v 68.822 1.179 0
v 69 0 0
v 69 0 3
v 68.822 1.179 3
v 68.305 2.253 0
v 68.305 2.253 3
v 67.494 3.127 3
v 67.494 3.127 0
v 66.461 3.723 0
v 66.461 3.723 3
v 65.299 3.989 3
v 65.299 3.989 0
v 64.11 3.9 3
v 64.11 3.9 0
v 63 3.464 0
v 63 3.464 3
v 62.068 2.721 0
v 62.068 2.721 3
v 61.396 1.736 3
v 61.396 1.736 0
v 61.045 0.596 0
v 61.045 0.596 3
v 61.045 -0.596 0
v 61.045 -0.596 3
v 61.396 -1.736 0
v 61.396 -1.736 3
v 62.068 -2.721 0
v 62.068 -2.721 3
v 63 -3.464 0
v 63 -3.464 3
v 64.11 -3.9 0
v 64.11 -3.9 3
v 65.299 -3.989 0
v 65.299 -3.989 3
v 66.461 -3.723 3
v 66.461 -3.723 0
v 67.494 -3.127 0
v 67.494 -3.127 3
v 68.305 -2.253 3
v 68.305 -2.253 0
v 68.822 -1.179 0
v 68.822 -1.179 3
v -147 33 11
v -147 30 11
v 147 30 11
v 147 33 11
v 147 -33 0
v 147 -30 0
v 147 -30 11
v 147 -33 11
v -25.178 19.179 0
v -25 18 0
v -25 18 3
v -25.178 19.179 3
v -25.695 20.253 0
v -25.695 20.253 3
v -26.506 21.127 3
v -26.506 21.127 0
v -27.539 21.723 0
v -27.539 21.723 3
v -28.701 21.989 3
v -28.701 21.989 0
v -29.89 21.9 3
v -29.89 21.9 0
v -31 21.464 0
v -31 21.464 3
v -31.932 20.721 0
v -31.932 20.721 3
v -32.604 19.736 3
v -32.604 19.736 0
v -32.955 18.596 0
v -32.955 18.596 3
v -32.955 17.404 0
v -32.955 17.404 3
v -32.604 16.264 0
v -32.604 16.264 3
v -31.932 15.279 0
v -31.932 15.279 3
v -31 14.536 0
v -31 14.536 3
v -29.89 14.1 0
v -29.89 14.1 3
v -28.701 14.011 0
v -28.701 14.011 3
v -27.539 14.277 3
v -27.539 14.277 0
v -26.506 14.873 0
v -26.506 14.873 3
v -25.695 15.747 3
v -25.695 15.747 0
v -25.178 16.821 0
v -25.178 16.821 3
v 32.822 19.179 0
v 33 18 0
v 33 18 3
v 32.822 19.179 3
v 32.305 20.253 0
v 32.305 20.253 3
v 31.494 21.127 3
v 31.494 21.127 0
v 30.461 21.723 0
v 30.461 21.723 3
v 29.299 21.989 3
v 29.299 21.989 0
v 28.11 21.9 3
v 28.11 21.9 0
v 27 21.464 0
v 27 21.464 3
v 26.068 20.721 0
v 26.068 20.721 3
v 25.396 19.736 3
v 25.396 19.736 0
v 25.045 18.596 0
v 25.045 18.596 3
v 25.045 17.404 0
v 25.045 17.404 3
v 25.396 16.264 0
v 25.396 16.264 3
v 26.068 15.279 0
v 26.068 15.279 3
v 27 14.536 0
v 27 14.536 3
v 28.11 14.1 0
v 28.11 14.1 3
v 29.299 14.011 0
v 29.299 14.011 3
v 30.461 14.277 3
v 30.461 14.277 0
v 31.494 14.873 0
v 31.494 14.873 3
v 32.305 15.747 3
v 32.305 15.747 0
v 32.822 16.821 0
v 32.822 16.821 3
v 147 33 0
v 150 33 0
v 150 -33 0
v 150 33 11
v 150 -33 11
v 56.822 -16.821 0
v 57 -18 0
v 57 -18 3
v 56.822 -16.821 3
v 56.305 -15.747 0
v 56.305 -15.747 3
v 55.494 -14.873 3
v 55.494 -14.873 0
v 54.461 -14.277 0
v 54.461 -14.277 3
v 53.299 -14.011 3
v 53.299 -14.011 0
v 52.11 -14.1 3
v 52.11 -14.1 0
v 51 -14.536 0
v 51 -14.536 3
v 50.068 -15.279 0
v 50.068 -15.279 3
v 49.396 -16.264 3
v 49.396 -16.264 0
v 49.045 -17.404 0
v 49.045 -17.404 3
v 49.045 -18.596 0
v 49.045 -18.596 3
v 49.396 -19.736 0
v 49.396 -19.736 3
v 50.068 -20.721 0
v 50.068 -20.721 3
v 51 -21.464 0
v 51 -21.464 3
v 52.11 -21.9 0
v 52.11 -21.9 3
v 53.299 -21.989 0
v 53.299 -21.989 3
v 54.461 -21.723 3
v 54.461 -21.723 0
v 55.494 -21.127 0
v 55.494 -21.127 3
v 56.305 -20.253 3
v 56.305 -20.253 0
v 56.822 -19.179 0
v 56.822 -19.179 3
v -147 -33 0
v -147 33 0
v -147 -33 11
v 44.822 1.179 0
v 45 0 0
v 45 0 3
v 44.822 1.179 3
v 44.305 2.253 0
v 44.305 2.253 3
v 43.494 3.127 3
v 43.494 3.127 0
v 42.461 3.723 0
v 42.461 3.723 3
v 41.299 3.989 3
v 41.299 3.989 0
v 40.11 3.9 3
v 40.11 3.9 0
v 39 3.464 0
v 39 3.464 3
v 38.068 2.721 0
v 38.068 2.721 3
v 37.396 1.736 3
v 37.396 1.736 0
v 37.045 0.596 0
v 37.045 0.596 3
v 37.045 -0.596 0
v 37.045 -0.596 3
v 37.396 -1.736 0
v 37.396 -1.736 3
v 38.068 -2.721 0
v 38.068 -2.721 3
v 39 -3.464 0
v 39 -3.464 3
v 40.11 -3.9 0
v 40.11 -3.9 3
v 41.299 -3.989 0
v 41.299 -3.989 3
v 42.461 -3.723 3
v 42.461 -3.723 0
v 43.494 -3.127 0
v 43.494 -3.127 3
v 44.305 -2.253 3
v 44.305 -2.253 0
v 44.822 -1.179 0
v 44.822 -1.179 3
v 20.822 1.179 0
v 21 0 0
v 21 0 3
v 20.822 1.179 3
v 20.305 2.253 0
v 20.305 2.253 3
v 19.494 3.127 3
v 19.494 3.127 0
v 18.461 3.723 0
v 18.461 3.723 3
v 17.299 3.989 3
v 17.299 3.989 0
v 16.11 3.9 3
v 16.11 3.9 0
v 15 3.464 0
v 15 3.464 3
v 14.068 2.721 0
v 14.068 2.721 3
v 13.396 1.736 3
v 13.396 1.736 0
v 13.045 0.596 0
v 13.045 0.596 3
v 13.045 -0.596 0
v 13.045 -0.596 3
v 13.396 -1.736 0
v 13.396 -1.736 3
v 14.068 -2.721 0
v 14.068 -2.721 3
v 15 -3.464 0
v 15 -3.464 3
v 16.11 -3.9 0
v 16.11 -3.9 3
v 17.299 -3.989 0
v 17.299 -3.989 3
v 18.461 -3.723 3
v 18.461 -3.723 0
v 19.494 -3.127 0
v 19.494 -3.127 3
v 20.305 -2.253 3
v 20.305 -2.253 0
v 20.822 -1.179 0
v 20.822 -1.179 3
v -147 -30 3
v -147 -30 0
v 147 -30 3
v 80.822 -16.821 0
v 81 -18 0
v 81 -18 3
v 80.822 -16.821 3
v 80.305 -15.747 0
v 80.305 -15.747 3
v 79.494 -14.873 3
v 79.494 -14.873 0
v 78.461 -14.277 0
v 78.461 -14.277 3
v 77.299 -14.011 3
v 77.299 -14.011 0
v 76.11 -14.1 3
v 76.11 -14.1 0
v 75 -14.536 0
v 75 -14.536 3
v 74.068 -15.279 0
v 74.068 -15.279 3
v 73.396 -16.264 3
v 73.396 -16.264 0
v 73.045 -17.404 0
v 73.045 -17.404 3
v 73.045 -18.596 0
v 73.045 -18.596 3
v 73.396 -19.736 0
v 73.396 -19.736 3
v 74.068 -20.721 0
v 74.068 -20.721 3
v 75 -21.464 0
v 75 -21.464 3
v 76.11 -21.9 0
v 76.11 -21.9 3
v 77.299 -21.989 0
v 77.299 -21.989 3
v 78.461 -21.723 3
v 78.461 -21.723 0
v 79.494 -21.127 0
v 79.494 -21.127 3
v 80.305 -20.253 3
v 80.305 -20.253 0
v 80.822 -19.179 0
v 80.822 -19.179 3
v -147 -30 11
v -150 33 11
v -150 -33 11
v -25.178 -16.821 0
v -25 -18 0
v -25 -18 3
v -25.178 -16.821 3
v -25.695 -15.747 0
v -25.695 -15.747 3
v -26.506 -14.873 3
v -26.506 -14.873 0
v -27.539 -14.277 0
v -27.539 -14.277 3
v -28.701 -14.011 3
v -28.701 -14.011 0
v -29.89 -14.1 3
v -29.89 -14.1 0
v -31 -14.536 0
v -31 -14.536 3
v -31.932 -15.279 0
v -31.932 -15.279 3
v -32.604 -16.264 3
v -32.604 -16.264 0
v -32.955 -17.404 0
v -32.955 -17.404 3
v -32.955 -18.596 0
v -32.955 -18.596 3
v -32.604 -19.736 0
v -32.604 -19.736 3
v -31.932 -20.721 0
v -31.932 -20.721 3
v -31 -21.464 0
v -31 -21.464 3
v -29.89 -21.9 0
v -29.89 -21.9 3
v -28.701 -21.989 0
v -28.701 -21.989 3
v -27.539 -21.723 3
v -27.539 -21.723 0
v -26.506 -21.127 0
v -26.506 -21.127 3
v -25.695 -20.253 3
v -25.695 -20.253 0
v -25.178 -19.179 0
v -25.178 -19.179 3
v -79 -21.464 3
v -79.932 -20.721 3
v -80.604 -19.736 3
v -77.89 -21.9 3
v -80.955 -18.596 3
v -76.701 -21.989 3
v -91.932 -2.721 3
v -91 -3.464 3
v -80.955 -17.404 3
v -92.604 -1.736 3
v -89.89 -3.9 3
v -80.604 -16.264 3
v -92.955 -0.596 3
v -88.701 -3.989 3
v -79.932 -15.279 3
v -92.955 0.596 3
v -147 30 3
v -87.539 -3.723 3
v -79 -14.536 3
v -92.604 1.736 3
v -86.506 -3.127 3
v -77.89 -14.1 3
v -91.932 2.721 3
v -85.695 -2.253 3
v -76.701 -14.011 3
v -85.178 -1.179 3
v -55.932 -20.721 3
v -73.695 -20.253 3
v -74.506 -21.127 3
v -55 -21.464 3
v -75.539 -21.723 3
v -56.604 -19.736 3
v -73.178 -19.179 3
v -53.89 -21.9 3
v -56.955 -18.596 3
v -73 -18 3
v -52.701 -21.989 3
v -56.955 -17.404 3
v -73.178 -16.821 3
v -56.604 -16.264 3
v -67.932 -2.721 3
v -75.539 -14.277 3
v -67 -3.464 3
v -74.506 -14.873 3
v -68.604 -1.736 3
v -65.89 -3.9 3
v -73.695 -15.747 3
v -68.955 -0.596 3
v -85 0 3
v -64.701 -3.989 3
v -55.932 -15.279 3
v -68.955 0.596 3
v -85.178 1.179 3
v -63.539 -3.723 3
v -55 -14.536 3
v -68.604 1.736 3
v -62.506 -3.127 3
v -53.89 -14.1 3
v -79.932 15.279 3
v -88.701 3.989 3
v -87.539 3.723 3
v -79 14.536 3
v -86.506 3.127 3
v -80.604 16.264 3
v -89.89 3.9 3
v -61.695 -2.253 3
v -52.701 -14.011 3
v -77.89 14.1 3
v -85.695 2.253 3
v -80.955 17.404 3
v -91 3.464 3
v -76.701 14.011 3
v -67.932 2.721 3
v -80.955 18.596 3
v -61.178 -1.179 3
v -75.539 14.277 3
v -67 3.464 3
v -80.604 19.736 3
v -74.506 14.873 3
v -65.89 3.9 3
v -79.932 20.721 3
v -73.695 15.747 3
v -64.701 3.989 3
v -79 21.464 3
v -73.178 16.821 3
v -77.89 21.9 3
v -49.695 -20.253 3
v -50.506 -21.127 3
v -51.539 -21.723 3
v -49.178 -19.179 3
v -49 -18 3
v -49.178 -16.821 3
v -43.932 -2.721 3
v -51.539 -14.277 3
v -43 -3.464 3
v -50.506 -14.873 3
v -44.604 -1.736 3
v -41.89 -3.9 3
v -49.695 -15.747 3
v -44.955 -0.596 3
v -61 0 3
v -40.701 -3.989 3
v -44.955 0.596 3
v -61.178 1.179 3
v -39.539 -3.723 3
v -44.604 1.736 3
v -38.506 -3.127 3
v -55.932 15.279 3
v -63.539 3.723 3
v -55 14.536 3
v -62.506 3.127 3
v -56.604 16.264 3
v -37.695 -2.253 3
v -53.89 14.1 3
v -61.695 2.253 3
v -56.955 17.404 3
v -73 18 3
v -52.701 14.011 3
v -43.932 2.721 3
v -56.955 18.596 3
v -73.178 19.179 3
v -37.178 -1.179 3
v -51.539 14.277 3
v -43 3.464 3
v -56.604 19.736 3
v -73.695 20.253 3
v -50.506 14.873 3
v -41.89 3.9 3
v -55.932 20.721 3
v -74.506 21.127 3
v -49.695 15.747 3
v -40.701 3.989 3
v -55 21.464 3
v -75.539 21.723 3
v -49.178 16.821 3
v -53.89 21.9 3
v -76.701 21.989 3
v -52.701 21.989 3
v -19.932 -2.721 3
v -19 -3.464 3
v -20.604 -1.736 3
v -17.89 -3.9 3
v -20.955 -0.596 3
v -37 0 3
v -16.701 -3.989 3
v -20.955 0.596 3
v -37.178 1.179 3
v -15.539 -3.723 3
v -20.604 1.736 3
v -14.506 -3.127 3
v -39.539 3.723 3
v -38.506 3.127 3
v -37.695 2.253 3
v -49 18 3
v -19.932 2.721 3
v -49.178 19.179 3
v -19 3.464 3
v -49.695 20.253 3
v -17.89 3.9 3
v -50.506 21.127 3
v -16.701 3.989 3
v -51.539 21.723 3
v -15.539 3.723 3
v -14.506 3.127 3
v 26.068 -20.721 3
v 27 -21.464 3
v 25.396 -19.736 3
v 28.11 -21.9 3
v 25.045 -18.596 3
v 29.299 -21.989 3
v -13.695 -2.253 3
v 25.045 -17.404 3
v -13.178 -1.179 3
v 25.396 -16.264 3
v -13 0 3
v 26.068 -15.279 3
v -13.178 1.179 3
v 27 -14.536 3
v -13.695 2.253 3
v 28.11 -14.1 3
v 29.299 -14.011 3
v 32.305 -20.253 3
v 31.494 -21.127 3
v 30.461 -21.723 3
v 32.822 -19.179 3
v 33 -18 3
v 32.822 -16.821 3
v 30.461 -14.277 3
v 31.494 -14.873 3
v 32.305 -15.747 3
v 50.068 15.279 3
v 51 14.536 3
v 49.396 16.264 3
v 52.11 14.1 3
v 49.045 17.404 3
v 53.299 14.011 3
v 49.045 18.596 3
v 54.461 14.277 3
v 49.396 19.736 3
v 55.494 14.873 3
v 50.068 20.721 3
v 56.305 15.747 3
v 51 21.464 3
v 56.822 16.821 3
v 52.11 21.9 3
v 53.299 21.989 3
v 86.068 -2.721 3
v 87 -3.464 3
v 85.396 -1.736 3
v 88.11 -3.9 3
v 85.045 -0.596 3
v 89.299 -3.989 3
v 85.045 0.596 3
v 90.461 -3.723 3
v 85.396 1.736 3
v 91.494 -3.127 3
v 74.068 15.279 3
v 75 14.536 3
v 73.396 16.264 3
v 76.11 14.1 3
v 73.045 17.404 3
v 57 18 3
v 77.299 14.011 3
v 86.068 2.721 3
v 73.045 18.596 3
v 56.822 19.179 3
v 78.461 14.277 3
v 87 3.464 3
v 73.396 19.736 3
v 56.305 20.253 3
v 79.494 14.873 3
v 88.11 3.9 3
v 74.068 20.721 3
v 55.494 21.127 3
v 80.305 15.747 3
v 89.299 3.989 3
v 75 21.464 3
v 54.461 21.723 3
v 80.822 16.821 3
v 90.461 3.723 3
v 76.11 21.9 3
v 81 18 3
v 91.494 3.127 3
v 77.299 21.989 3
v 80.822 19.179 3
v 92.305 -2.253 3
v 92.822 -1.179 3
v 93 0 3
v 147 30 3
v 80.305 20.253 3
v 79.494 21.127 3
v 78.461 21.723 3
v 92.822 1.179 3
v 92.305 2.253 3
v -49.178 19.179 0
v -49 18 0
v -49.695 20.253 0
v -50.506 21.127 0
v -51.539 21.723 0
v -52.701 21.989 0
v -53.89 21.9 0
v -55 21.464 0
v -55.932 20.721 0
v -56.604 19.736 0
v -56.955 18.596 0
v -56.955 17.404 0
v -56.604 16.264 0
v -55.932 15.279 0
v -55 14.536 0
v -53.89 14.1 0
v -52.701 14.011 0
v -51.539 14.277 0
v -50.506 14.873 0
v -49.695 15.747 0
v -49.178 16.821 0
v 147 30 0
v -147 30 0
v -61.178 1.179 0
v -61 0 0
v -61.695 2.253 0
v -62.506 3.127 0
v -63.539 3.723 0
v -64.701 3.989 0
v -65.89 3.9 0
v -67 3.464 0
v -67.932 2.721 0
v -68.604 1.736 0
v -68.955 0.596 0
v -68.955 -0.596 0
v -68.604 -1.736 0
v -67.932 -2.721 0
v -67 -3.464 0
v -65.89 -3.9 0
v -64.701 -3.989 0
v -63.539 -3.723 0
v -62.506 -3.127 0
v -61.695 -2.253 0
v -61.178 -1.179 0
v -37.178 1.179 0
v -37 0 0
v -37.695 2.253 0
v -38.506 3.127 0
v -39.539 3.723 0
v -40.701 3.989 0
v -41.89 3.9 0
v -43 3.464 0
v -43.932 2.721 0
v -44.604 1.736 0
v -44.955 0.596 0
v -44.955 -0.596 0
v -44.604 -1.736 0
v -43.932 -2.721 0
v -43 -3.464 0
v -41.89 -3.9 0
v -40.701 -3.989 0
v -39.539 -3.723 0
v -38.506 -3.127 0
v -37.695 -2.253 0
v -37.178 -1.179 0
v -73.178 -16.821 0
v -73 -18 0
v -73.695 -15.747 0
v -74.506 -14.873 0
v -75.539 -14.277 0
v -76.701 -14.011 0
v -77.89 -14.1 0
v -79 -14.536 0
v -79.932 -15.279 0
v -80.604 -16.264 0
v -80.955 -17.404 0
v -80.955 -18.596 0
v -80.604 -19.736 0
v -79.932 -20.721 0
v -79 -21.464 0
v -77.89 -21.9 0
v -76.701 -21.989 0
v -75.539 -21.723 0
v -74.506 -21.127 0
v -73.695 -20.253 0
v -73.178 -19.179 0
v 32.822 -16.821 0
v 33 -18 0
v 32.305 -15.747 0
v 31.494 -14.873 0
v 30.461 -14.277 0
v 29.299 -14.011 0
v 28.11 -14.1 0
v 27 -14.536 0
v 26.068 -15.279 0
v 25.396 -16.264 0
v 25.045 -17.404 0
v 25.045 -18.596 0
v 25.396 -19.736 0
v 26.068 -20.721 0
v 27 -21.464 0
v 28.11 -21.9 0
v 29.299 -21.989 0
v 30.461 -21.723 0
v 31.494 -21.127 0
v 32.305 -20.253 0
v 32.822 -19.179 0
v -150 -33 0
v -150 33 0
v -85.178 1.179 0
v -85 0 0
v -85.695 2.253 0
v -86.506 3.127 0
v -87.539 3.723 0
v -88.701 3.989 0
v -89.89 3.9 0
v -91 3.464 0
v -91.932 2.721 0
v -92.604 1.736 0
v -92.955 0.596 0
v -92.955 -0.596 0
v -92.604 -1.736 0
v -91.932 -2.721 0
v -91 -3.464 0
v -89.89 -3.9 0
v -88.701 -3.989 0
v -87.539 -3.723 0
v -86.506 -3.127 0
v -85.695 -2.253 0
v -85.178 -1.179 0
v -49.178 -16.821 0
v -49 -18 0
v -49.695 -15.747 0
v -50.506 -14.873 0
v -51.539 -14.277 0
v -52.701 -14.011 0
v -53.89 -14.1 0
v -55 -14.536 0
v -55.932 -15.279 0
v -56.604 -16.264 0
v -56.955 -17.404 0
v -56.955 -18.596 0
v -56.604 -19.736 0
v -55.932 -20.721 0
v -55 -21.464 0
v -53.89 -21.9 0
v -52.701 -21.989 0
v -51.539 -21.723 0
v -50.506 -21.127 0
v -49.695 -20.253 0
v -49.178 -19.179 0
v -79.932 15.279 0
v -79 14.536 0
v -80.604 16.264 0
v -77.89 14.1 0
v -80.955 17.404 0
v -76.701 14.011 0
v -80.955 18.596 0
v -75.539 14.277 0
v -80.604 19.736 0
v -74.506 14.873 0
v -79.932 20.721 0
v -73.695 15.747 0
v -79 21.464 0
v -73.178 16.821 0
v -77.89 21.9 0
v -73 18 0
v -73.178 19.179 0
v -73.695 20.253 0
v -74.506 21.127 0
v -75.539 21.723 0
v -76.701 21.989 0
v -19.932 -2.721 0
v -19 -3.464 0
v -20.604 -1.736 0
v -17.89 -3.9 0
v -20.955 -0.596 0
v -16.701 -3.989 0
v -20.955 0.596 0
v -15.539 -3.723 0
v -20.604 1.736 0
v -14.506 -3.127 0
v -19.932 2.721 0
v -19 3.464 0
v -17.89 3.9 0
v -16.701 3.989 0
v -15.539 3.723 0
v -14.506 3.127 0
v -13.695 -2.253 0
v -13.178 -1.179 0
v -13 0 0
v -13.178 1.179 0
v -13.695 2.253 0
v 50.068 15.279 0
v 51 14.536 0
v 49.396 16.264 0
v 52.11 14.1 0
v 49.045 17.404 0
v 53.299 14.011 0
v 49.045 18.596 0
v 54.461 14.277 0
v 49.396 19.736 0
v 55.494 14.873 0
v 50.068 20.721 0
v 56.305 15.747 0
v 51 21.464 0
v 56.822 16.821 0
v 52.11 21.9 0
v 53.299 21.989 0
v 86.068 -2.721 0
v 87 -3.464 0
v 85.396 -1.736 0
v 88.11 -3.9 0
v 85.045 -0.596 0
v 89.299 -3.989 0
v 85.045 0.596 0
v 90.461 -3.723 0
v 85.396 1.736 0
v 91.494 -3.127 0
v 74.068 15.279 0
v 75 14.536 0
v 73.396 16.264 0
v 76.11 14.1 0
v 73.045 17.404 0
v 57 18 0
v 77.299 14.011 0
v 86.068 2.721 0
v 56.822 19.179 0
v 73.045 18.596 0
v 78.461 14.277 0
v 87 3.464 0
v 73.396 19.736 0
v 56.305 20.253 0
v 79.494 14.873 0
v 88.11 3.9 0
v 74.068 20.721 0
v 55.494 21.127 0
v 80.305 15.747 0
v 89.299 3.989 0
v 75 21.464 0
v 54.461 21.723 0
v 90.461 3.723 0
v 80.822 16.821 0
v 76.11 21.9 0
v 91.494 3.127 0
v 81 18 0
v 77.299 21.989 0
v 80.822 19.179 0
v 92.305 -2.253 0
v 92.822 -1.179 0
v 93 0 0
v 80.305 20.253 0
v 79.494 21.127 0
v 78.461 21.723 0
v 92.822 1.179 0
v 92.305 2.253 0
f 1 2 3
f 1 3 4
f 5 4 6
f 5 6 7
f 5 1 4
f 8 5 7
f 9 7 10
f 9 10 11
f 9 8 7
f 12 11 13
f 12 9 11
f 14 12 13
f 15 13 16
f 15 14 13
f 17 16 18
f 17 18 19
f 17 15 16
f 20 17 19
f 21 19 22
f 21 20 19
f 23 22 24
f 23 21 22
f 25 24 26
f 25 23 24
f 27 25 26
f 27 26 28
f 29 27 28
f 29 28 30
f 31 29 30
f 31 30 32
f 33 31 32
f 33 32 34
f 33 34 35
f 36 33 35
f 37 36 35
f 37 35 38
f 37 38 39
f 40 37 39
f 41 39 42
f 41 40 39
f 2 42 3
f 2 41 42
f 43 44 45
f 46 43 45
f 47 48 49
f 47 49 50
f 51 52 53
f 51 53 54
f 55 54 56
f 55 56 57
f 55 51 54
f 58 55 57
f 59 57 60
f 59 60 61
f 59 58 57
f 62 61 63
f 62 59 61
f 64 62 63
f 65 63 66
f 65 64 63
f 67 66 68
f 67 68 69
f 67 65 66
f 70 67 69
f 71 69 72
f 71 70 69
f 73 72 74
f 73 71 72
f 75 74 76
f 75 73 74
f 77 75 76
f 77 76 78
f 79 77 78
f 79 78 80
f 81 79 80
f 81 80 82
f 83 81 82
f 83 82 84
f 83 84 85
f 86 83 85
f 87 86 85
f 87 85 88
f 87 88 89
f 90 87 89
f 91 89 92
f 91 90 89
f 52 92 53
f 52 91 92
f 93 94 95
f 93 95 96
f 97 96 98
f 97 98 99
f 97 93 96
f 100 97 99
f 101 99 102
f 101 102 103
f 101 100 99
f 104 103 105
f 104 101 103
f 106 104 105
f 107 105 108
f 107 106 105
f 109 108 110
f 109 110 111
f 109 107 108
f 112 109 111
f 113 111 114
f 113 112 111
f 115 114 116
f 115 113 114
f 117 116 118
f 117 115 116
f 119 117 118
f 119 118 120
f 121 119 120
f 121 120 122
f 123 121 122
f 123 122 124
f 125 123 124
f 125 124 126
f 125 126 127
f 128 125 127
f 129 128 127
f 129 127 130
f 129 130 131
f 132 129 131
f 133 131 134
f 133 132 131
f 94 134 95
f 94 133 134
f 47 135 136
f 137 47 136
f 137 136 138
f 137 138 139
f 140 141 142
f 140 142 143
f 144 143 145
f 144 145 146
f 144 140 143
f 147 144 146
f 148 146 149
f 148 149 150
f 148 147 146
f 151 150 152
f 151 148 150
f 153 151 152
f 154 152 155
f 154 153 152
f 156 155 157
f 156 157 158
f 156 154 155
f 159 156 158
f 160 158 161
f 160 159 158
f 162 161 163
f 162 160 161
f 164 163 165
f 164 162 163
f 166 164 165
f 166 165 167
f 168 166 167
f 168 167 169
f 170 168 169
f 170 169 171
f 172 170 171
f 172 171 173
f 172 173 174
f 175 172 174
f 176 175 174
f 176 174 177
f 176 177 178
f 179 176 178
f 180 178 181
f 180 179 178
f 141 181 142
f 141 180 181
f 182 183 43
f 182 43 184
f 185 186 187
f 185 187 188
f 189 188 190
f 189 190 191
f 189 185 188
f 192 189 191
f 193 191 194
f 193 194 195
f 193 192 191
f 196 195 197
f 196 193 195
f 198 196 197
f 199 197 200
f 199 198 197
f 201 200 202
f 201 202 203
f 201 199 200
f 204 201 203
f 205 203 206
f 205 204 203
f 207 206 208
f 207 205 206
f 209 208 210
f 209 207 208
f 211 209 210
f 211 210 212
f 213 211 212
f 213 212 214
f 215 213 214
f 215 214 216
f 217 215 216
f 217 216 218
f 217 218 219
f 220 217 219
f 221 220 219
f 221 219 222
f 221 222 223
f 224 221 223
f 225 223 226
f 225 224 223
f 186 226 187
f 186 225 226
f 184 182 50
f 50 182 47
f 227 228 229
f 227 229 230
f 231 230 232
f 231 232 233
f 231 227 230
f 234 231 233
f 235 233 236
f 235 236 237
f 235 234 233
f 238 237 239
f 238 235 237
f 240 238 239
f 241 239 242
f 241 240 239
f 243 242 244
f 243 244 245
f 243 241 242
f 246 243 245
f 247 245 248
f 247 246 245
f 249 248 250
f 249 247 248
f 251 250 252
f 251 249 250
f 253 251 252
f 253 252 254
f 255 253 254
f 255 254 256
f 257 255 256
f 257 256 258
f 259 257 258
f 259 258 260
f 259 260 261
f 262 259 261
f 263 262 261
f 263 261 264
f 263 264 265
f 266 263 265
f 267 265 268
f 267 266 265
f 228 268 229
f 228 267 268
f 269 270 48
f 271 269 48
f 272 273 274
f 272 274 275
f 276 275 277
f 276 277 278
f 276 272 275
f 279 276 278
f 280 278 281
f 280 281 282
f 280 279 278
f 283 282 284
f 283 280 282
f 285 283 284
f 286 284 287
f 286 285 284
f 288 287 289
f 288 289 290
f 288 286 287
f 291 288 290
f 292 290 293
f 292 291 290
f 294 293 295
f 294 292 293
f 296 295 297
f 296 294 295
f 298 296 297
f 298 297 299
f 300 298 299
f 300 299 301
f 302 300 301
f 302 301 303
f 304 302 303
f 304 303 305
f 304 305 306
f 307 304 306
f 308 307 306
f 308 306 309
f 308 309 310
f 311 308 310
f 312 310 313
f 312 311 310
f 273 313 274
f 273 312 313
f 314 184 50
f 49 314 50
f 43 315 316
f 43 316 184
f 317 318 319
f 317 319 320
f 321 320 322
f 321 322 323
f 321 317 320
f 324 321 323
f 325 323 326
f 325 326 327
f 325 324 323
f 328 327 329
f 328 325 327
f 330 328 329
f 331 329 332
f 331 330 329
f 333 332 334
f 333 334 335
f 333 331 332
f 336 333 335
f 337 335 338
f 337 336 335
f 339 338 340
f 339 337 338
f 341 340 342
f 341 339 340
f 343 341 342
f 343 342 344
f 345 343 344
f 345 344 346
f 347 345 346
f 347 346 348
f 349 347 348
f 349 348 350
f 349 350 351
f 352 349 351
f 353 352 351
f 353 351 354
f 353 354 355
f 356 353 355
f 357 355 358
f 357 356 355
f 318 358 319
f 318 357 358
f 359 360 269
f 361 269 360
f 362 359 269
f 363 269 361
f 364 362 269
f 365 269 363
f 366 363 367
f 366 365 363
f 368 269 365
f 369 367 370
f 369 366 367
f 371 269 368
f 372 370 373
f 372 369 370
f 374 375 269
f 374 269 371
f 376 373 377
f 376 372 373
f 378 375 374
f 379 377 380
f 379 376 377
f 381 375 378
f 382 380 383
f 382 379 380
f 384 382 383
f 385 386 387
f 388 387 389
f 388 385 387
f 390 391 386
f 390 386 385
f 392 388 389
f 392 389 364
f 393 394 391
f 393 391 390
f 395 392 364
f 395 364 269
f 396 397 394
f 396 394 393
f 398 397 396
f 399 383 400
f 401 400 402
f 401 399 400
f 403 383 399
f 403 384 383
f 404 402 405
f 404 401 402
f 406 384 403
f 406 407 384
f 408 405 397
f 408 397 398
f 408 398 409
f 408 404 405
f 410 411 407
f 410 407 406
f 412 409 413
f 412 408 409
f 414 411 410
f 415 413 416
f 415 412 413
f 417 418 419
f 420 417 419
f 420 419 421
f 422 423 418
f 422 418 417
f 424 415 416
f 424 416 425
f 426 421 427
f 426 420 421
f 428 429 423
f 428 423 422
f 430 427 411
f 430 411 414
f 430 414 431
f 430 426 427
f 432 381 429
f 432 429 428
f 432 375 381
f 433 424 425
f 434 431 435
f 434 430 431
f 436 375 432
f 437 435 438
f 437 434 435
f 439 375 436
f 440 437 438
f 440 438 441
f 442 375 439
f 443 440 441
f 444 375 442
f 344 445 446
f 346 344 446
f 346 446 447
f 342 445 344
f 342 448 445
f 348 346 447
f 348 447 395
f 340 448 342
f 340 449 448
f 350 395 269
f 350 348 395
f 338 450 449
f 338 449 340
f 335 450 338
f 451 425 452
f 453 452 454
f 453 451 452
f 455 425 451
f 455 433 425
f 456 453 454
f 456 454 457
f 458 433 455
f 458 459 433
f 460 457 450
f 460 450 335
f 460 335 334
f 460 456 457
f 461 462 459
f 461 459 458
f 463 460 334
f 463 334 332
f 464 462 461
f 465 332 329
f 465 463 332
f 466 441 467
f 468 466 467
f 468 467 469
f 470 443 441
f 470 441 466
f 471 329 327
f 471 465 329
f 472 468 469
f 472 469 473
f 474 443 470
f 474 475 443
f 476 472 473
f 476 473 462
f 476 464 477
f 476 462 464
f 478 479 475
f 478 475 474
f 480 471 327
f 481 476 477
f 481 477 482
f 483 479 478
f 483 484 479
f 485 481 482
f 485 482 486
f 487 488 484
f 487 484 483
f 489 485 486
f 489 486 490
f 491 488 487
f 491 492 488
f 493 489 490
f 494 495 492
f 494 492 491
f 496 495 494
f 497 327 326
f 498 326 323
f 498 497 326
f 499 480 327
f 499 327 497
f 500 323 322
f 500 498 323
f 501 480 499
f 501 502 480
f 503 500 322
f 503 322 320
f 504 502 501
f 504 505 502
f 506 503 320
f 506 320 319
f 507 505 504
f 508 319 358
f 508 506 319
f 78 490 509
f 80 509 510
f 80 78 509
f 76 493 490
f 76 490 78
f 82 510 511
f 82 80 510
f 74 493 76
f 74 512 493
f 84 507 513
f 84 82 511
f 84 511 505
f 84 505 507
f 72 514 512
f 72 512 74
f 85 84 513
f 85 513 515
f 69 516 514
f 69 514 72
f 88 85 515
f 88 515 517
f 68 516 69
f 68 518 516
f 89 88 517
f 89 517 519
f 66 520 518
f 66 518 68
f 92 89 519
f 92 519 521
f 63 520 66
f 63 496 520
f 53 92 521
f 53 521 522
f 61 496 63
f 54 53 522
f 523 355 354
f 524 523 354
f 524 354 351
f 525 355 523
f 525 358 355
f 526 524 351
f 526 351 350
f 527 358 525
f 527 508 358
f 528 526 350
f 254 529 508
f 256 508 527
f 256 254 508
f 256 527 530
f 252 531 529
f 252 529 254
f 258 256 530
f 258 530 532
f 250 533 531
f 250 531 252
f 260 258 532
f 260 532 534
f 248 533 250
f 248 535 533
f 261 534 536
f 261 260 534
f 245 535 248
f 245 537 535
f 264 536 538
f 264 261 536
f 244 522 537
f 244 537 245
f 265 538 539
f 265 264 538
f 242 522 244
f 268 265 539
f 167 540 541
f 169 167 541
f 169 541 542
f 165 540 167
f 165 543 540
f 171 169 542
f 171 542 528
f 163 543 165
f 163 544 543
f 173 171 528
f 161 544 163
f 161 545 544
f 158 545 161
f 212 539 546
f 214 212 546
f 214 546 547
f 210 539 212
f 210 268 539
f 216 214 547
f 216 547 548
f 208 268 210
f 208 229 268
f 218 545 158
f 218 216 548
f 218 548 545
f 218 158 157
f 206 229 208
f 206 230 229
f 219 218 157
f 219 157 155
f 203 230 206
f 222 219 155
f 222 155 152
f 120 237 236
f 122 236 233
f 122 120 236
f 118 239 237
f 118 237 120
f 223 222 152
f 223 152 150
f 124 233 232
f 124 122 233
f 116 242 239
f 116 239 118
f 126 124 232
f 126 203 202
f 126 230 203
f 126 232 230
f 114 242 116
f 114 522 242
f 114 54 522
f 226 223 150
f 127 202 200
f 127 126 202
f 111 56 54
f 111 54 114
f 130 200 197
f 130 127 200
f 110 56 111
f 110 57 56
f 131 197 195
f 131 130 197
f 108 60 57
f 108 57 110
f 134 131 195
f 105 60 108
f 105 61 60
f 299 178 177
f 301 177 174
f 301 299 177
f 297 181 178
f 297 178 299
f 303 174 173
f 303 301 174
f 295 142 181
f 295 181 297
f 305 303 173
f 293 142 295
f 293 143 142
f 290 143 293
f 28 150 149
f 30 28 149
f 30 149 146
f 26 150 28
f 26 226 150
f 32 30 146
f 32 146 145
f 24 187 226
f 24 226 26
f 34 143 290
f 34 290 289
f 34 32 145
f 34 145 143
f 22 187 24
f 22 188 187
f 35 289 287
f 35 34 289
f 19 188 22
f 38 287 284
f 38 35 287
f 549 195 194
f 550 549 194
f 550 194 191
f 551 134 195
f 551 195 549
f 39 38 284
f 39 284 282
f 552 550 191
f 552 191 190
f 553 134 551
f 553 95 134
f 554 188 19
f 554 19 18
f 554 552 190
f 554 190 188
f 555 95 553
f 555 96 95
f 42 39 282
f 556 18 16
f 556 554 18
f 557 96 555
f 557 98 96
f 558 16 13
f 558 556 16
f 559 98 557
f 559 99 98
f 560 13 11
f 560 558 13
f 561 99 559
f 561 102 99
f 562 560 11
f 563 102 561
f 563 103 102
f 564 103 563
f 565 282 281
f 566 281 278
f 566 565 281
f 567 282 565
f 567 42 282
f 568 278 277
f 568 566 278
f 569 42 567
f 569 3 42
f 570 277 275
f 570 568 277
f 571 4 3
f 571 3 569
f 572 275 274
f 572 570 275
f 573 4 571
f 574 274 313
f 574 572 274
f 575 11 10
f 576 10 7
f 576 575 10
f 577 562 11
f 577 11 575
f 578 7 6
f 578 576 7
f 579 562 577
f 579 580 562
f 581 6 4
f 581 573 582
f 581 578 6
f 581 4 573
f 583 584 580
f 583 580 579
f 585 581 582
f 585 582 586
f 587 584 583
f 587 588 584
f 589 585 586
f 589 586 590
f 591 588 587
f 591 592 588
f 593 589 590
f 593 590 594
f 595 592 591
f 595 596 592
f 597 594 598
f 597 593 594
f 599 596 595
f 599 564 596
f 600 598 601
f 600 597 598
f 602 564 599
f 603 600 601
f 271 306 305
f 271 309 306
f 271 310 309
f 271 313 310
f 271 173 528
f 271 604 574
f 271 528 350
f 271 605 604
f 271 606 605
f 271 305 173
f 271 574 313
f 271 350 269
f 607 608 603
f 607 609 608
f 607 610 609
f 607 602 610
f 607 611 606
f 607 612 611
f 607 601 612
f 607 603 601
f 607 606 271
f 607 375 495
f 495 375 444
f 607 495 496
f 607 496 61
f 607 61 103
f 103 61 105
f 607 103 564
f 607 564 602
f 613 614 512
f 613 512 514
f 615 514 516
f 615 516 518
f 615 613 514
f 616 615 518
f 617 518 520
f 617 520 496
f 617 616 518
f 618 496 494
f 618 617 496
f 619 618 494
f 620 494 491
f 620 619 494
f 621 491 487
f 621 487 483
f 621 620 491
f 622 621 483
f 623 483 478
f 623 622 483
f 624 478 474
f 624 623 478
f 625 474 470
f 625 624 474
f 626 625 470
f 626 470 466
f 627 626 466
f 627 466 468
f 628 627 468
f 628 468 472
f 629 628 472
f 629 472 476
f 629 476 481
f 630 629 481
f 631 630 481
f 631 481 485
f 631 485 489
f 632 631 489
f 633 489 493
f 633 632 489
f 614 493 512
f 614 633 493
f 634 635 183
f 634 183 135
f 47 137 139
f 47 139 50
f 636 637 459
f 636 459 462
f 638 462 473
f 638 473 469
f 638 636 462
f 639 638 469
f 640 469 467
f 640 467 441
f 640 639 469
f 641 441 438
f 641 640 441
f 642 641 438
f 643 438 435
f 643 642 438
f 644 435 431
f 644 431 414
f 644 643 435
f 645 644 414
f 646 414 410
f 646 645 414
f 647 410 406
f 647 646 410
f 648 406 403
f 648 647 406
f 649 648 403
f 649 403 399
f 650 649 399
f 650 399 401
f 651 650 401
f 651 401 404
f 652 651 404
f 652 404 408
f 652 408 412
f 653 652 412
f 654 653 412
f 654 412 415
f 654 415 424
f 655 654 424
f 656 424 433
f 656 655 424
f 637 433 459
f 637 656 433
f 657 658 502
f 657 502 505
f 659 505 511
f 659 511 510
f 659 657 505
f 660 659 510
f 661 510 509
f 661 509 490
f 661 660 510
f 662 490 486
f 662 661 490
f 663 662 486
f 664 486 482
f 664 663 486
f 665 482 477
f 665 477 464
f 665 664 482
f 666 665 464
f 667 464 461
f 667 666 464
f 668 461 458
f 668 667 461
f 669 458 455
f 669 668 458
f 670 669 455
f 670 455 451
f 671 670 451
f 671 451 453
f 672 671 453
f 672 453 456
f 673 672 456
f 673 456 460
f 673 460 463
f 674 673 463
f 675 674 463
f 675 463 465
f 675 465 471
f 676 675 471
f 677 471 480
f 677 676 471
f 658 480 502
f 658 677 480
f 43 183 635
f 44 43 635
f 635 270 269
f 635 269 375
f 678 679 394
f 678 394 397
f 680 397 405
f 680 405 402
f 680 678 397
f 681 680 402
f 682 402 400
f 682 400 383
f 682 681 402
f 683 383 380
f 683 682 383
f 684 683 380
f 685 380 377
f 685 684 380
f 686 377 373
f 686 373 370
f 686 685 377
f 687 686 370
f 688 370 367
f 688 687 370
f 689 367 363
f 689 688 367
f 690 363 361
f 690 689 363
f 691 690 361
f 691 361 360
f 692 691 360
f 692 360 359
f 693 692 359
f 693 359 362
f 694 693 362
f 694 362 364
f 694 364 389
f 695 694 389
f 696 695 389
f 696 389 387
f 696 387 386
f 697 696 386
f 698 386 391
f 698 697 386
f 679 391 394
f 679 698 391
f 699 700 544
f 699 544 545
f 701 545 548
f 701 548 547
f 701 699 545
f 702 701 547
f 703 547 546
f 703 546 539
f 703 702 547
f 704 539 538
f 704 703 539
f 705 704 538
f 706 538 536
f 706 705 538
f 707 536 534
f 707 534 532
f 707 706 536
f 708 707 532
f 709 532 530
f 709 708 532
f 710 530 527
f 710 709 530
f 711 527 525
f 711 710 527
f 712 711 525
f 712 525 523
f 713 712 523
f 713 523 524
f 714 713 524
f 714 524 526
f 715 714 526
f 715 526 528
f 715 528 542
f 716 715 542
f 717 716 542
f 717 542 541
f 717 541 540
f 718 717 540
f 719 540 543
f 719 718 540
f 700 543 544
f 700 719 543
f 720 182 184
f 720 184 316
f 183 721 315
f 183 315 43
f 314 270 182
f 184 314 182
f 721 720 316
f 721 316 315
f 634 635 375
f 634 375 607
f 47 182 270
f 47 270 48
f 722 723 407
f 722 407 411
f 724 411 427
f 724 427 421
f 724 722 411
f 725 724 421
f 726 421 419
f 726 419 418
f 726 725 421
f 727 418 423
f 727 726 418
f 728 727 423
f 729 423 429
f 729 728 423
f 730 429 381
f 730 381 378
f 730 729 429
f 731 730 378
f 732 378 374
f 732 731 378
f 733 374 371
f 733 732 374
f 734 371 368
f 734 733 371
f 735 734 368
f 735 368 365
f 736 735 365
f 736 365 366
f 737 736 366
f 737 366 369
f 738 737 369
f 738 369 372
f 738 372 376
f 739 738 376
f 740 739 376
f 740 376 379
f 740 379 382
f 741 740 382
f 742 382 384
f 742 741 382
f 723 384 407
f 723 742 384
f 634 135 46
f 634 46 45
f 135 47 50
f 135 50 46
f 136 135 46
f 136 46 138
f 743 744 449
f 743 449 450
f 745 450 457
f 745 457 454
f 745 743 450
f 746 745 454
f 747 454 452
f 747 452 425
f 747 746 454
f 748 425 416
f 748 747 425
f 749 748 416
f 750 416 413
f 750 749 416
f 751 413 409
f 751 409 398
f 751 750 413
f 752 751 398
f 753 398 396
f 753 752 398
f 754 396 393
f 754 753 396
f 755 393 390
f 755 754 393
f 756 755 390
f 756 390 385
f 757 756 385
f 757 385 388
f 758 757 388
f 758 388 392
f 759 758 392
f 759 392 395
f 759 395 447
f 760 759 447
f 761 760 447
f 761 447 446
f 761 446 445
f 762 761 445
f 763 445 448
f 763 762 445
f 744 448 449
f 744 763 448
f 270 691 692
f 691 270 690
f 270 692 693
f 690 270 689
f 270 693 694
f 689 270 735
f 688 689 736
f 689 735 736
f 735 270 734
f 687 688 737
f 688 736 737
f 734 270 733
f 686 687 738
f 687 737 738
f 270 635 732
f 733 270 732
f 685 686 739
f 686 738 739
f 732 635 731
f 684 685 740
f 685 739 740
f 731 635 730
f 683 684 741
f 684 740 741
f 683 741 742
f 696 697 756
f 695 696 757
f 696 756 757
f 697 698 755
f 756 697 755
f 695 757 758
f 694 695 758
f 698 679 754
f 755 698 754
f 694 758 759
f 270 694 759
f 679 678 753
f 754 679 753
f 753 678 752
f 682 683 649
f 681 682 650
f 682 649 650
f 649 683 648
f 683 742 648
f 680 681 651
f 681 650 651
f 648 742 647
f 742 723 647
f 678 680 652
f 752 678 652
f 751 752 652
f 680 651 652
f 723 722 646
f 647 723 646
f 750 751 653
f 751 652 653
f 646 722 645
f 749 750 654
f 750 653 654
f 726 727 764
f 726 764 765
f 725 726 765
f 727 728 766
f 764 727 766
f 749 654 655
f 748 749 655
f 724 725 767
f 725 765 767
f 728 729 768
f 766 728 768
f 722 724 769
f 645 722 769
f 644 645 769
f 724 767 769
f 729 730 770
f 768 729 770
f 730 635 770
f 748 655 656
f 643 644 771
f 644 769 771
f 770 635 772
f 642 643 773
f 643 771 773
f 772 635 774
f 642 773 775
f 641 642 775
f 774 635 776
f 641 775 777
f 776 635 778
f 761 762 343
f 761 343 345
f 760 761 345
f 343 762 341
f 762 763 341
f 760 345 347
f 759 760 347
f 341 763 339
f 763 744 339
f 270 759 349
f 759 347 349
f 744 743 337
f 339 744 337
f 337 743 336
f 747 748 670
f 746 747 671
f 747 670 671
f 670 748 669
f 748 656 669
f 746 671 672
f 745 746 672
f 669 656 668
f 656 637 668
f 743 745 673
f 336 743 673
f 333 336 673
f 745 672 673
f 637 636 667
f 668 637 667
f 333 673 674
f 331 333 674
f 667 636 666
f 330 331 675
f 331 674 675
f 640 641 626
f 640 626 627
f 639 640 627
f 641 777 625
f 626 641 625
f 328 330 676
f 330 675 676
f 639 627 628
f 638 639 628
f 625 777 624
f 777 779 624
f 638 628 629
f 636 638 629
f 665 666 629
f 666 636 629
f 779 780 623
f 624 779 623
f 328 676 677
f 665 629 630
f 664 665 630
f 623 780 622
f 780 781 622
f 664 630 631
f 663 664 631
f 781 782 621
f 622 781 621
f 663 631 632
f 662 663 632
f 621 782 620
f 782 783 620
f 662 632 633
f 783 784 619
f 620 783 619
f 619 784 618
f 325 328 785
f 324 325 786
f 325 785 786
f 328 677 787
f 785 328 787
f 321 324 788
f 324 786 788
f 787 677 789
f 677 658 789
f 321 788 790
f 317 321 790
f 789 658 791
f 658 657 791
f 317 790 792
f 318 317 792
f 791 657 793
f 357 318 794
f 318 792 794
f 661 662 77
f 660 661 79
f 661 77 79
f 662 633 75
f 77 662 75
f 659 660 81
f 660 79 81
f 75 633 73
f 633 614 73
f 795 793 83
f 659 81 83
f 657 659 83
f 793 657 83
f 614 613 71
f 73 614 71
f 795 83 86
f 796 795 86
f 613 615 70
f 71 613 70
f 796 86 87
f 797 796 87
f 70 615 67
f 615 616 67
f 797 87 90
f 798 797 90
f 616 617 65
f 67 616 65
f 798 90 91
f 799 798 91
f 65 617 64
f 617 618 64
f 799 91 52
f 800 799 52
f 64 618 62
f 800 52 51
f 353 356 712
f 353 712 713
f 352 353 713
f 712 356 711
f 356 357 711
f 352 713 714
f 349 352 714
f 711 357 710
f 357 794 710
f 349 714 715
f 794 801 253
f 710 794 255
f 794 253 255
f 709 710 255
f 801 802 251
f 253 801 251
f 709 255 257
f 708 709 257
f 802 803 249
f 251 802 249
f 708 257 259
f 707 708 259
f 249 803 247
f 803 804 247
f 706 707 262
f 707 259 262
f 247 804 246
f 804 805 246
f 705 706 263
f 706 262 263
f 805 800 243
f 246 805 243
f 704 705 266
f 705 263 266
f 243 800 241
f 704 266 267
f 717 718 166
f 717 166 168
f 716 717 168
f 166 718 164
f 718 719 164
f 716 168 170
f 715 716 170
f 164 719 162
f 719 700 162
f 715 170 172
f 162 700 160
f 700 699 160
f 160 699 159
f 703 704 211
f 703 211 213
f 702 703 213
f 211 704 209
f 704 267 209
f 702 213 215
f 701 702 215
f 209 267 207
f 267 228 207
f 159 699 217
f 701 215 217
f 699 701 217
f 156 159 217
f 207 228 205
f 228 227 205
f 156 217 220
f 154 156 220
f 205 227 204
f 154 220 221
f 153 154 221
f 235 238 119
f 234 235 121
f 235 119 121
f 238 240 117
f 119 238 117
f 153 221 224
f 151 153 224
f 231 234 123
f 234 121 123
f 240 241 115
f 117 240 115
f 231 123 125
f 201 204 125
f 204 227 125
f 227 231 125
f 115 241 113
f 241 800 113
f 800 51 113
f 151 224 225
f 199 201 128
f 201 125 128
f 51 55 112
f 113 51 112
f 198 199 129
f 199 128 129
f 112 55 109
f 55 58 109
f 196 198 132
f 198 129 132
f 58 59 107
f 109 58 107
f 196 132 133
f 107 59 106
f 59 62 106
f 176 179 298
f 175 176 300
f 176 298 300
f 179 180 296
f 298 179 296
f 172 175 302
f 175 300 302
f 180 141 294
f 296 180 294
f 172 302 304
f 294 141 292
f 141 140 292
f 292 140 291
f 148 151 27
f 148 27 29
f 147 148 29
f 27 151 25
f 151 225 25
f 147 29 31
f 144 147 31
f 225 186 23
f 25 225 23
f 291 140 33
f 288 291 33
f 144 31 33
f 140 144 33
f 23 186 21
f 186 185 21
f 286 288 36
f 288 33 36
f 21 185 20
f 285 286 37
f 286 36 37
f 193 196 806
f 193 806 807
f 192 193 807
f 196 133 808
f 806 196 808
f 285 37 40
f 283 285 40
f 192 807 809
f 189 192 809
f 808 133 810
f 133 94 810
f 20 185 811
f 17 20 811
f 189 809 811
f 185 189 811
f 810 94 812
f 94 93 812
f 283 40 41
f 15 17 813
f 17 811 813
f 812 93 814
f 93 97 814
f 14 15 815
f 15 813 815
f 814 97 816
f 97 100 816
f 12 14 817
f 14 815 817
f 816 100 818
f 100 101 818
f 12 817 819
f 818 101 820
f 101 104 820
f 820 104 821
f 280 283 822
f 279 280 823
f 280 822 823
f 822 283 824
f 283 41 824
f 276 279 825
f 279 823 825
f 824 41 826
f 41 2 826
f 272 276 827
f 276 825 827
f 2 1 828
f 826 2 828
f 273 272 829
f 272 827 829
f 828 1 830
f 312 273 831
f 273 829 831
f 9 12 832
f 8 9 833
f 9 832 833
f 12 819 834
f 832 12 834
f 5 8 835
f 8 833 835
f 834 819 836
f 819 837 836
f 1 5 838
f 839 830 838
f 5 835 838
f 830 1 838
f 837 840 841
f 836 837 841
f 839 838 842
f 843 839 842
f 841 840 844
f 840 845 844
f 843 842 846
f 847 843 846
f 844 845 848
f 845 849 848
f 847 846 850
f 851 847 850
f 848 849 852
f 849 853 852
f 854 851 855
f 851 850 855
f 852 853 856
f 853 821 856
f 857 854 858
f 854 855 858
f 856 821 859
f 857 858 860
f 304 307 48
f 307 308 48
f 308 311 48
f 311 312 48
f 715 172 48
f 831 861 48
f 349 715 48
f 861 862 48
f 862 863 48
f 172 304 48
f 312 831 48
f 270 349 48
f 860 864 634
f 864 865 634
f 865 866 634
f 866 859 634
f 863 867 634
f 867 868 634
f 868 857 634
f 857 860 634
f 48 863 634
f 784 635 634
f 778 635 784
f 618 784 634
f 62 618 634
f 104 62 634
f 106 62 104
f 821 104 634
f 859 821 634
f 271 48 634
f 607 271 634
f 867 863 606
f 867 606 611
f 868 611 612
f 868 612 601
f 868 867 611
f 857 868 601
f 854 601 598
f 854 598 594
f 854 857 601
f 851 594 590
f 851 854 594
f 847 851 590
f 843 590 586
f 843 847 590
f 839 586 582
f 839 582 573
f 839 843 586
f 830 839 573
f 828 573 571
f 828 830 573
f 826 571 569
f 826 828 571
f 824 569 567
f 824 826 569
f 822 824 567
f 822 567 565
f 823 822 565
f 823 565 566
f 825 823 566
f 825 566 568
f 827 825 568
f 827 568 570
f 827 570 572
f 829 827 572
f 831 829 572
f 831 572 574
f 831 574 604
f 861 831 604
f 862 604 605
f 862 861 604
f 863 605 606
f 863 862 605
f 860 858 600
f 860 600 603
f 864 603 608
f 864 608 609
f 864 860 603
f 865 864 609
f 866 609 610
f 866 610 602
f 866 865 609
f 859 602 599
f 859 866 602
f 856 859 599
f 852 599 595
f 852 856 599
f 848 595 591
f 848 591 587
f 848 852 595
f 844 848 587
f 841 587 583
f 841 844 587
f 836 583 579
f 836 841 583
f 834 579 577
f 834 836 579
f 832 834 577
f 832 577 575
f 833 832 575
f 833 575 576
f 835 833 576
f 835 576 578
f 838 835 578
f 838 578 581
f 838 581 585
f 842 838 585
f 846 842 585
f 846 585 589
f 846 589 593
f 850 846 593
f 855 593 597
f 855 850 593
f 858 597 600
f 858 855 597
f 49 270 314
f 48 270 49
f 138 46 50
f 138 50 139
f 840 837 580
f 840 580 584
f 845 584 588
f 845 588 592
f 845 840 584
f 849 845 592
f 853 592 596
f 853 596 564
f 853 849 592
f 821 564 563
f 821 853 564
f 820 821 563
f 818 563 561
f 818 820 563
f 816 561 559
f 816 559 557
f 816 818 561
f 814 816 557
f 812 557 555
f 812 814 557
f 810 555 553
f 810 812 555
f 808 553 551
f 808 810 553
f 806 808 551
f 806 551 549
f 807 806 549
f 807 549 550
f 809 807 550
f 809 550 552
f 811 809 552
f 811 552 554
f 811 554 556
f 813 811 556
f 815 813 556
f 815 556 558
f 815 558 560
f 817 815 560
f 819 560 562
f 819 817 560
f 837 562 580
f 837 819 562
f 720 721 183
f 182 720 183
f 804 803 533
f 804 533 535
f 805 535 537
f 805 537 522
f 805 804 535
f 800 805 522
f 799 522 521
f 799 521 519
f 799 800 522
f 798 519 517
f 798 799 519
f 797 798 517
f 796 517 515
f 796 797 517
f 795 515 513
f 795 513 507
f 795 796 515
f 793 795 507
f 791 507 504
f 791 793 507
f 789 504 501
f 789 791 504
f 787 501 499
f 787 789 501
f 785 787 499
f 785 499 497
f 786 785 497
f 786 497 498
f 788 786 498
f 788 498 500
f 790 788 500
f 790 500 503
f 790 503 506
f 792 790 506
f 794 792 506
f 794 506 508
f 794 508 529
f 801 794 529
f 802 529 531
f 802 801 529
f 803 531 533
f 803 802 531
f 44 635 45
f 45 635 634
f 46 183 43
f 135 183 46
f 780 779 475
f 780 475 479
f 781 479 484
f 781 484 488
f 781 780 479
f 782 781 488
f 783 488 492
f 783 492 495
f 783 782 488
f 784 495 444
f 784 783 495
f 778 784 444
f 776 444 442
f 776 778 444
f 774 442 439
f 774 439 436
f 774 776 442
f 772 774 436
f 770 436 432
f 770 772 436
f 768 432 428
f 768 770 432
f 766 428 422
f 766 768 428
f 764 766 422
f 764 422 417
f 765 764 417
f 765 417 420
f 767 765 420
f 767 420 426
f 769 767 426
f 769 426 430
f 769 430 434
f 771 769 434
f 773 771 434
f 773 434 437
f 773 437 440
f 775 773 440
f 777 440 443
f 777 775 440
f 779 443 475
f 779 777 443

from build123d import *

# Parameters (mm, degrees)
F0_W     = 294
F0_H     = 60
F0_R     = 4
F1_DEPTH = 3
F2_W     = 294
F2_H     = 3
F3_DEPTH = 11
F5_DEPTH = 11


with BuildPart() as f1:
    # F0 (on Top) → F1 (new body)
    with BuildSketch(Plane.XY):
        Rectangle(F0_W, F0_H)
        with Locations((-77, -18)):
            Circle(F0_R, mode=Mode.SUBTRACT)
        with Locations((-53, -18)):
            Circle(F0_R, mode=Mode.SUBTRACT)
        with Locations((-29, -18)):
            Circle(F0_R, mode=Mode.SUBTRACT)
        with Locations((29, -18)):
            Circle(F0_R, mode=Mode.SUBTRACT)
        with Locations((53, -18)):
            Circle(F0_R, mode=Mode.SUBTRACT)
        with Locations((77, -18)):
            Circle(F0_R, mode=Mode.SUBTRACT)
        with Locations((-89, 0)):
            Circle(F0_R, mode=Mode.SUBTRACT)
        with Locations((-65, 0)):
            Circle(F0_R, mode=Mode.SUBTRACT)
        with Locations((-41, 0)):
            Circle(F0_R, mode=Mode.SUBTRACT)
        with Locations((-17, 0)):
            Circle(F0_R, mode=Mode.SUBTRACT)
        with Locations((-77, 18)):
            Circle(F0_R, mode=Mode.SUBTRACT)
        with Locations((-53, 18)):
            Circle(F0_R, mode=Mode.SUBTRACT)
        with Locations((-29, 18)):
            Circle(F0_R, mode=Mode.SUBTRACT)
        with Locations((17, 0)):
            Circle(F0_R, mode=Mode.SUBTRACT)
        with Locations((41, 0)):
            Circle(F0_R, mode=Mode.SUBTRACT)
        with Locations((65, 0)):
            Circle(F0_R, mode=Mode.SUBTRACT)
        with Locations((89, 0)):
            Circle(F0_R, mode=Mode.SUBTRACT)
        with Locations((29, 18)):
            Circle(F0_R, mode=Mode.SUBTRACT)
        with Locations((53, 18)):
            Circle(F0_R, mode=Mode.SUBTRACT)
        with Locations((77, 18)):
            Circle(F0_R, mode=Mode.SUBTRACT)
    extrude(amount=F1_DEPTH)


with BuildPart() as f3:
    # F2 (on face) → F3 (new body)
    with BuildSketch(Plane(origin=(0, 0, 0), x_dir=(1, 0, 0), z_dir=(0, 0, -1))):
        with Locations((0, 31.5)):
            Rectangle(F2_W, F2_H)
        with Locations((0, -31.5)):
            Rectangle(F2_W, F2_H)
    extrude(amount=-F3_DEPTH)


with BuildPart() as f5:
    # F4 (on face) → F5 (new body)
    with BuildSketch(Plane(origin=(0, 0, 0), x_dir=(1, 0, 0), z_dir=(0, 0, -1))):
        Polygon((-147, -30), (-147, 30), (-147, 33), (-150, 33), (-150, -33), (-147, -33), align=None)
        Polygon((147, 33), (147, 30), (147, -30), (147, -33), (150, -33), (150, 33), align=None)
    extrude(amount=-F5_DEPTH)


solid = Compound([f1.part, f3.part, f5.part])
